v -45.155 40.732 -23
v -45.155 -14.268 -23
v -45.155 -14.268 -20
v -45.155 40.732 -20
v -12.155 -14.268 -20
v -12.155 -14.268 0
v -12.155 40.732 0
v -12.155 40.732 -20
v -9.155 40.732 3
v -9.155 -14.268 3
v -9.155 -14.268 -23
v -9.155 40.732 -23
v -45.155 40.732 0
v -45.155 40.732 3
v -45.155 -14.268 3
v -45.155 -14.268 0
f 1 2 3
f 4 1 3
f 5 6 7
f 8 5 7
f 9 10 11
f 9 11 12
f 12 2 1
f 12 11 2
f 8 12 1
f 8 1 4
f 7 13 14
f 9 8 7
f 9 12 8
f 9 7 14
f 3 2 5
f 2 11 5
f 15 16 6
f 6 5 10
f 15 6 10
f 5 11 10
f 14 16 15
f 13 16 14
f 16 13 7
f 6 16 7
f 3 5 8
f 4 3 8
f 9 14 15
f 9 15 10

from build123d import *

# Parameters (mm, degrees)
ESQUISSE1_W             = 36
ESQUISSE1_H             = 80
BOSS_EXTRU_1_DEPTH      = 3
ESQUISSE2_W             = 3
ESQUISSE2_H             = 55
BOSS_EXTRU_2_DEPTH      = 23
ESQUISSE3_W             = 3
ESQUISSE3_H             = 55
BOSS_EXTRU_3_DEPTH      = 33
ESQUISSE4_W             = 36
ESQUISSE4_H             = 25
ENL_V_MAT_EXTRU_1_DEPTH = 33


with BuildPart() as part:
    # Esquisse1 → Boss.-Extru.1 (new body)
    with BuildSketch(Plane.XY):
        with Locations((-27.15451692, 0.732402707)):
            Rectangle(ESQUISSE1_W, ESQUISSE1_H)
    extrude(amount=BOSS_EXTRU_1_DEPTH)

    # Esquisse2 → Boss.-Extru.2 (add)
    with BuildSketch(Plane(origin=(0, 0, 0), x_dir=(-1, 0, 0), z_dir=(0, 0, -1))):
        with Locations((10.65451692, 13.232402707)):
            Rectangle(ESQUISSE2_W, ESQUISSE2_H)
    extrude(amount=BOSS_EXTRU_2_DEPTH)

    # Esquisse3 → Boss.-Extru.3 (add)
    with BuildSketch(Plane.ZY.offset(12.15451692)):
        with Locations((-21.5, 13.232402707)):
            Rectangle(ESQUISSE3_W, ESQUISSE3_H)
    extrude(amount=BOSS_EXTRU_3_DEPTH)

    # Esquisse4 → Enlèv. mat.-Extru.1 (cut)
    with BuildSketch(Plane(origin=(0, 0, 0), x_dir=(-1, 0, 0), z_dir=(0, 0, -1))):
        with Locations((27.15451692, -26.767597293)):
            Rectangle(ESQUISSE4_W, ESQUISSE4_H)
    extrude(amount=-ENL_V_MAT_EXTRU_1_DEPTH, mode=Mode.SUBTRACT)


solid = part.part
